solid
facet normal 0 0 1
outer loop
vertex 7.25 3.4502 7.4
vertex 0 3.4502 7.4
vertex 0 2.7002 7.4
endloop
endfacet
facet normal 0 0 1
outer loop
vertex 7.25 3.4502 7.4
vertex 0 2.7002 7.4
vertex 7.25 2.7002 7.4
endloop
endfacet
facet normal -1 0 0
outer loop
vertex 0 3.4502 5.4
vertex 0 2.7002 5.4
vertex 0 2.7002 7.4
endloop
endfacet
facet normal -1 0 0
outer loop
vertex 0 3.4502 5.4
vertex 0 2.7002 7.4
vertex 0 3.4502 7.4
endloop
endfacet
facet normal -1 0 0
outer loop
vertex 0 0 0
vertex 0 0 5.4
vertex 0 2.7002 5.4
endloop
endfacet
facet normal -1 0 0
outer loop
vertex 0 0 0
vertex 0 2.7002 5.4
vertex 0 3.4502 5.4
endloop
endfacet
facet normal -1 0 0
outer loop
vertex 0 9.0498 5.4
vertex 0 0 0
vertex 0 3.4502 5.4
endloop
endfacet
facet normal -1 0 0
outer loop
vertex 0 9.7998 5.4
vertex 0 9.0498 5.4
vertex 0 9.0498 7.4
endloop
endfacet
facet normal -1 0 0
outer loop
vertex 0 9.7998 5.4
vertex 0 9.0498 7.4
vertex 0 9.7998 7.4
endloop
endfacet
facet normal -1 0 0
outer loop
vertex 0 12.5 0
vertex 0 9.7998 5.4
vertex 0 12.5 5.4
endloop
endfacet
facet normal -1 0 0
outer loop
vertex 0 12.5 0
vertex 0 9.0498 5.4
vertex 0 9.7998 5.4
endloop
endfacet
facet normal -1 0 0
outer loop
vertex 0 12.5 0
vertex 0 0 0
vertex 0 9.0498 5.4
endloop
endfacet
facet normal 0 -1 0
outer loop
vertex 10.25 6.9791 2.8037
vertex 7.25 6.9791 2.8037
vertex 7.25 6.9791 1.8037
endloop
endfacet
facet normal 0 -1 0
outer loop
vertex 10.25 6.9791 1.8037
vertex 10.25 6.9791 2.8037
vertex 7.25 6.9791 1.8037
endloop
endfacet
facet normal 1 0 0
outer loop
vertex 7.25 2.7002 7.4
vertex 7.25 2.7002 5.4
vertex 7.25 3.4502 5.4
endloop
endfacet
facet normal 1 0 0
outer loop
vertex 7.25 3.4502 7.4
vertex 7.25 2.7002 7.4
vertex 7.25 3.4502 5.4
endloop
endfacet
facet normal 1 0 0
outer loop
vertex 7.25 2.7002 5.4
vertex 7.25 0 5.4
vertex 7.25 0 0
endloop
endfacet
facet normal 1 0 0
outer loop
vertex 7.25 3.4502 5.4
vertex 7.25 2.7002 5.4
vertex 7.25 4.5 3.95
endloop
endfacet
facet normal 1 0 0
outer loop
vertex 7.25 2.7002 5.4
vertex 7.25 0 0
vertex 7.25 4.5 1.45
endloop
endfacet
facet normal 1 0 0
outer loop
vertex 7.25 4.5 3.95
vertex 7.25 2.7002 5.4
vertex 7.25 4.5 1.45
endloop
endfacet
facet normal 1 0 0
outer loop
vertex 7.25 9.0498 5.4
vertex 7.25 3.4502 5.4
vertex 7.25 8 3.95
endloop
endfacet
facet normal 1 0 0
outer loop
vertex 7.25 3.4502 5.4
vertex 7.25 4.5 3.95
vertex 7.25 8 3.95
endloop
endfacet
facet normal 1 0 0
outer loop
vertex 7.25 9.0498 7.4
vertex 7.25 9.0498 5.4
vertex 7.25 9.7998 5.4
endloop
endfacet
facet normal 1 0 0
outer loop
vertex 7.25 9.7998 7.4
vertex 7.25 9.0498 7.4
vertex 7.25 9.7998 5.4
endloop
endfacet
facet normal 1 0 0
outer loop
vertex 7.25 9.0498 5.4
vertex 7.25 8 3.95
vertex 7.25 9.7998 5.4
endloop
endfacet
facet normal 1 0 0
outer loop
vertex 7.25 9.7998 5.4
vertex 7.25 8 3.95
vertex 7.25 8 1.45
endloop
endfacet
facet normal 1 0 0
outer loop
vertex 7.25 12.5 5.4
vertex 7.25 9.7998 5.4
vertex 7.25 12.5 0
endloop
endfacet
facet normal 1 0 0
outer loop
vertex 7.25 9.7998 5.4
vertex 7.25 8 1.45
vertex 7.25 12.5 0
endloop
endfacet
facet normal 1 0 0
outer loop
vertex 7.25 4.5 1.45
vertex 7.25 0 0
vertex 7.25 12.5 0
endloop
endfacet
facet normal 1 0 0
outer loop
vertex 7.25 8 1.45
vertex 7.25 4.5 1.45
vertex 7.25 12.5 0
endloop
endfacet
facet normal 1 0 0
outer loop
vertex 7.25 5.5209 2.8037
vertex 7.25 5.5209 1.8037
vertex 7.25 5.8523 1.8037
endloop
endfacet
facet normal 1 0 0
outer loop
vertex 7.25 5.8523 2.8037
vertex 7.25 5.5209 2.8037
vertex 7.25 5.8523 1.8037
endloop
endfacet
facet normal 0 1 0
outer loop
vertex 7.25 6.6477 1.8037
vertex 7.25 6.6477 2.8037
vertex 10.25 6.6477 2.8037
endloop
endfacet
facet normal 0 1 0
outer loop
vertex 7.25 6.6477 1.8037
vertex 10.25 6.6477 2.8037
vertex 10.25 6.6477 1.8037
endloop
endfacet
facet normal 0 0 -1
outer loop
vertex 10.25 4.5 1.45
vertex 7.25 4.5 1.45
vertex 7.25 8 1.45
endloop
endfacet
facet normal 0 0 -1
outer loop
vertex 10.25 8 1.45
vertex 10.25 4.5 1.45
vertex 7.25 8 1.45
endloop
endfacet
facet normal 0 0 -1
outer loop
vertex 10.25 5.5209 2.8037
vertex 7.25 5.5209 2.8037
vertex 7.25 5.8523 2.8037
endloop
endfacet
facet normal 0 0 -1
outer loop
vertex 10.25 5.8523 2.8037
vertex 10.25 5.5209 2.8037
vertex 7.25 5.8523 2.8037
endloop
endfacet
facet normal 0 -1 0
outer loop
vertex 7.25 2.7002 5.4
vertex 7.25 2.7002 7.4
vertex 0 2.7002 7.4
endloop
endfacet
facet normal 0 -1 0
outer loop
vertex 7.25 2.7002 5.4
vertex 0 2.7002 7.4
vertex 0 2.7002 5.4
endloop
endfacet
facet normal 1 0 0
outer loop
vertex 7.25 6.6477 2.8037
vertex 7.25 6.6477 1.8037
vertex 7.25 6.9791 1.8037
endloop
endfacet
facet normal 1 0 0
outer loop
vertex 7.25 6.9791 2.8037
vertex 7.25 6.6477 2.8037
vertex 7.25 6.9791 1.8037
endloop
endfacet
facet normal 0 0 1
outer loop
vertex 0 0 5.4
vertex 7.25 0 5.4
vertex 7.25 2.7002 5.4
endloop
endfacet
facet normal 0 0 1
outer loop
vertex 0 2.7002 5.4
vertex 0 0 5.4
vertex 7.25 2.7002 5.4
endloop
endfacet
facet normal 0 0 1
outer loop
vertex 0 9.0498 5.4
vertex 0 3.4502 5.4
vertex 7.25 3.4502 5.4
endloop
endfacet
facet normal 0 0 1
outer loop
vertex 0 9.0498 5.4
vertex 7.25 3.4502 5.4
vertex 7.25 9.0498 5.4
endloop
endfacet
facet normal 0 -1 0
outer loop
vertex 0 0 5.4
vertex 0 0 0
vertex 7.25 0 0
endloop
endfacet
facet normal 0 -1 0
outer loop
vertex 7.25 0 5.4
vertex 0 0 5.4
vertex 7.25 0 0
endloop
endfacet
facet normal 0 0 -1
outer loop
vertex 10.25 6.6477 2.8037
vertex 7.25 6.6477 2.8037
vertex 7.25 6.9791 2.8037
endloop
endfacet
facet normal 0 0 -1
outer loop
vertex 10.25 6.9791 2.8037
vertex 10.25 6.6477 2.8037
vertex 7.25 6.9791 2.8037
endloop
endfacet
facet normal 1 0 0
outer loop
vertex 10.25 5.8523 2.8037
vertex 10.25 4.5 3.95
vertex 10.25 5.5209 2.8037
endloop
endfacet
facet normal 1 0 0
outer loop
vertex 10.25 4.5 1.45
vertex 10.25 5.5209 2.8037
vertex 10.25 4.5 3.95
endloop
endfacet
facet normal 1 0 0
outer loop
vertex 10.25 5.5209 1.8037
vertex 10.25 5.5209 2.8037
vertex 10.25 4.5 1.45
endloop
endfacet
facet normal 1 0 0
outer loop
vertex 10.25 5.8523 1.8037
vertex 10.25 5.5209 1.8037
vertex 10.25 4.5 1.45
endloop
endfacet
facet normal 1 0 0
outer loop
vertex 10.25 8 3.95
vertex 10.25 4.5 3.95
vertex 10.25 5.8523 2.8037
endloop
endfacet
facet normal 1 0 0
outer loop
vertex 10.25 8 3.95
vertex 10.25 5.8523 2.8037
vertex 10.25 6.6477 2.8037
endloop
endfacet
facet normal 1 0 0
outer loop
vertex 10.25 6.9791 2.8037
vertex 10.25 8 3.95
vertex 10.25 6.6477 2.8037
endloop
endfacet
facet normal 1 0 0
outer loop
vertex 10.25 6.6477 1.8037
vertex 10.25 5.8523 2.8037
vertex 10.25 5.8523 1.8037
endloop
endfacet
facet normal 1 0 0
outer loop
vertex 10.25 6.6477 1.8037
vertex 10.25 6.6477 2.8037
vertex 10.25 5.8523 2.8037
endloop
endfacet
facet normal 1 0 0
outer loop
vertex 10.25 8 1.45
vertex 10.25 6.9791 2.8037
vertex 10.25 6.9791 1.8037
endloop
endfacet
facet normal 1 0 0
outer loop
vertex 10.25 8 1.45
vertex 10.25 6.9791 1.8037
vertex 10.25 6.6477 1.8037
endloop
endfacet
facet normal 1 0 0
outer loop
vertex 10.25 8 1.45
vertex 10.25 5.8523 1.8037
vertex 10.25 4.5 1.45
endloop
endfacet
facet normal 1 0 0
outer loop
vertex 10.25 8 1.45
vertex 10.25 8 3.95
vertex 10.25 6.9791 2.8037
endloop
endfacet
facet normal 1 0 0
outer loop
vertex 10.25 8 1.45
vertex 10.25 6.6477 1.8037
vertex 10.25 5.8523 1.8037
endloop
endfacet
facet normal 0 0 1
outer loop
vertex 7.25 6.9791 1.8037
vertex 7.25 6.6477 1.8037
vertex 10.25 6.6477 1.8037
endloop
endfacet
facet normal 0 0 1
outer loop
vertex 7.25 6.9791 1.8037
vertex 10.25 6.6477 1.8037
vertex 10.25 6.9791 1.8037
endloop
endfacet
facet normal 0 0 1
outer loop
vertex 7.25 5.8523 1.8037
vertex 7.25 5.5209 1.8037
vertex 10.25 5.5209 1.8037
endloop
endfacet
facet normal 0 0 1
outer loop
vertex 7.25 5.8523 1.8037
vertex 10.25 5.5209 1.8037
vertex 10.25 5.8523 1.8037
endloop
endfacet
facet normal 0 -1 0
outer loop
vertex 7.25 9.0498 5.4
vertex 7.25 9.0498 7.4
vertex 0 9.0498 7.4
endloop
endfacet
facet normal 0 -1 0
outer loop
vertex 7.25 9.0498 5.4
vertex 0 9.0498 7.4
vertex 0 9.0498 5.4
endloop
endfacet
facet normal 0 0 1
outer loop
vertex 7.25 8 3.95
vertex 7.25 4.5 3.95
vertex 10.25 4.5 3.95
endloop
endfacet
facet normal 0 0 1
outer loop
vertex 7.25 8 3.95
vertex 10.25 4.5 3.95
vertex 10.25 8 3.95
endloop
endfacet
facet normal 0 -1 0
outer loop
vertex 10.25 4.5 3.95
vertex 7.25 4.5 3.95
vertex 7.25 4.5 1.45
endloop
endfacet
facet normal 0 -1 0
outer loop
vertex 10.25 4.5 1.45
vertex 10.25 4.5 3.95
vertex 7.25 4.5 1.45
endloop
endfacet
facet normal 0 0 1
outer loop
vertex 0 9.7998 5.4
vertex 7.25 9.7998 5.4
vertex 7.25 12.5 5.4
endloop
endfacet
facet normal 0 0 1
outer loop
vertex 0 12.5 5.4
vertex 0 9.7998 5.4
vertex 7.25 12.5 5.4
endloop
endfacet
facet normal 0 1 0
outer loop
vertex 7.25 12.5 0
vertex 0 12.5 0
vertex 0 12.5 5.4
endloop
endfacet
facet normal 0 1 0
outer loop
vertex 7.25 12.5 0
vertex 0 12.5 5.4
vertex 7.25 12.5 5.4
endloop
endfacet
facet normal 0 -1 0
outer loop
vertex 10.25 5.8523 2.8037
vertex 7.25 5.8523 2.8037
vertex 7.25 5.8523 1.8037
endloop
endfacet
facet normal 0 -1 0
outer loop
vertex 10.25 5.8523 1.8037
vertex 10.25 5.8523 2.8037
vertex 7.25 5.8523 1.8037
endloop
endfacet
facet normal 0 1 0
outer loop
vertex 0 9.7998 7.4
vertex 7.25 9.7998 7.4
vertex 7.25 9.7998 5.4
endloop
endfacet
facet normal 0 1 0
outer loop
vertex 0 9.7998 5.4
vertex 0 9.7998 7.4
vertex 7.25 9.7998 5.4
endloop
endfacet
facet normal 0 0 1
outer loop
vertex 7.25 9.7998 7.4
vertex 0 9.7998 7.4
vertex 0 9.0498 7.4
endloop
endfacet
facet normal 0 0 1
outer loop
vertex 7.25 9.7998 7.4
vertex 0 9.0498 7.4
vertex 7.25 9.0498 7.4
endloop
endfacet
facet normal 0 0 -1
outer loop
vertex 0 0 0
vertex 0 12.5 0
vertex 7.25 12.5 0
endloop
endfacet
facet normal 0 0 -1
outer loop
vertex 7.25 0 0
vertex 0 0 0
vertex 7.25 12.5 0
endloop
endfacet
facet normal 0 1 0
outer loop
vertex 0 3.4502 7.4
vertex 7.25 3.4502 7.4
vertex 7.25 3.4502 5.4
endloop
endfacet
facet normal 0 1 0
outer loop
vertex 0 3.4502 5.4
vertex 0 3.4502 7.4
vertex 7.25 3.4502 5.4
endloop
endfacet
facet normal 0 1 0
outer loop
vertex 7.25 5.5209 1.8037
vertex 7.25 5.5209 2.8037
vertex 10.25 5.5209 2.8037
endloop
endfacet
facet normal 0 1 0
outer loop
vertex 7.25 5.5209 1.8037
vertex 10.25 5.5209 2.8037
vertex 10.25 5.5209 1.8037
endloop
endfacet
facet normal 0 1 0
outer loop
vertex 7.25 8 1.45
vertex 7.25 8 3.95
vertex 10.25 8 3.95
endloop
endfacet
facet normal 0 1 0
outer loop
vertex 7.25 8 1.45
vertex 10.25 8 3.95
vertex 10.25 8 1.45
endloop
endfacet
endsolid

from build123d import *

# Parameters (mm, degrees)
SKETCH1_W           = 7.25
SKETCH1_H           = 12.5
BOSS_EXTRUDE1_DEPTH = 7.4
SKETCH2_W           = 2
SKETCH2_H           = 2.700167795
SKETCH2_H_2         = 5.59966441
CUT_EXTRUDE1_DEPTH  = 8.25
SKETCH3_W           = 2.5
SKETCH3_H           = 3.5
SKETCH3_W_2         = 1
SKETCH3_H_2         = 0.331350256
BOSS_EXTRUDE2_DEPTH = 3


with BuildPart() as part:
    # Sketch1 → Boss-Extrude1 (new body)
    with BuildSketch(Plane.XY):
        with Locations((3.625, 6.25)):
            Rectangle(SKETCH1_W, SKETCH1_H)
    extrude(amount=BOSS_EXTRUDE1_DEPTH)

    # Sketch2 → Cut-Extrude1 (cut, through all)
    with BuildSketch(Plane(origin=(7.25, 0, 0), x_dir=(0, 0, -1), z_dir=(1, 0, 0))):
        with Locations((-6.4, 11.149916103)):
            Rectangle(SKETCH2_W, SKETCH2_H)
        with Locations((-6.4, 1.350083898)):
            Rectangle(SKETCH2_W, SKETCH2_H)
        with Locations((-6.4, 6.25)):
            Rectangle(SKETCH2_W, SKETCH2_H_2)
    extrude(amount=-CUT_EXTRUDE1_DEPTH, mode=Mode.SUBTRACT)

    # Sketch3 → Boss-Extrude2 (add)
    with BuildSketch(Plane(origin=(7.25, 0, 0), x_dir=(0, 0, -1), z_dir=(1, 0, 0))):
        with Locations((-2.7, 6.25)):
            Rectangle(SKETCH3_W, SKETCH3_H)
        with Locations((-2.303664878, 5.686580017)):
            Rectangle(SKETCH3_W_2, SKETCH3_H_2, mode=Mode.SUBTRACT)
        with Locations((-2.303664878, 6.813419983)):
            Rectangle(SKETCH3_W_2, SKETCH3_H_2, mode=Mode.SUBTRACT)
    extrude(amount=BOSS_EXTRUDE2_DEPTH)


solid = part.part
